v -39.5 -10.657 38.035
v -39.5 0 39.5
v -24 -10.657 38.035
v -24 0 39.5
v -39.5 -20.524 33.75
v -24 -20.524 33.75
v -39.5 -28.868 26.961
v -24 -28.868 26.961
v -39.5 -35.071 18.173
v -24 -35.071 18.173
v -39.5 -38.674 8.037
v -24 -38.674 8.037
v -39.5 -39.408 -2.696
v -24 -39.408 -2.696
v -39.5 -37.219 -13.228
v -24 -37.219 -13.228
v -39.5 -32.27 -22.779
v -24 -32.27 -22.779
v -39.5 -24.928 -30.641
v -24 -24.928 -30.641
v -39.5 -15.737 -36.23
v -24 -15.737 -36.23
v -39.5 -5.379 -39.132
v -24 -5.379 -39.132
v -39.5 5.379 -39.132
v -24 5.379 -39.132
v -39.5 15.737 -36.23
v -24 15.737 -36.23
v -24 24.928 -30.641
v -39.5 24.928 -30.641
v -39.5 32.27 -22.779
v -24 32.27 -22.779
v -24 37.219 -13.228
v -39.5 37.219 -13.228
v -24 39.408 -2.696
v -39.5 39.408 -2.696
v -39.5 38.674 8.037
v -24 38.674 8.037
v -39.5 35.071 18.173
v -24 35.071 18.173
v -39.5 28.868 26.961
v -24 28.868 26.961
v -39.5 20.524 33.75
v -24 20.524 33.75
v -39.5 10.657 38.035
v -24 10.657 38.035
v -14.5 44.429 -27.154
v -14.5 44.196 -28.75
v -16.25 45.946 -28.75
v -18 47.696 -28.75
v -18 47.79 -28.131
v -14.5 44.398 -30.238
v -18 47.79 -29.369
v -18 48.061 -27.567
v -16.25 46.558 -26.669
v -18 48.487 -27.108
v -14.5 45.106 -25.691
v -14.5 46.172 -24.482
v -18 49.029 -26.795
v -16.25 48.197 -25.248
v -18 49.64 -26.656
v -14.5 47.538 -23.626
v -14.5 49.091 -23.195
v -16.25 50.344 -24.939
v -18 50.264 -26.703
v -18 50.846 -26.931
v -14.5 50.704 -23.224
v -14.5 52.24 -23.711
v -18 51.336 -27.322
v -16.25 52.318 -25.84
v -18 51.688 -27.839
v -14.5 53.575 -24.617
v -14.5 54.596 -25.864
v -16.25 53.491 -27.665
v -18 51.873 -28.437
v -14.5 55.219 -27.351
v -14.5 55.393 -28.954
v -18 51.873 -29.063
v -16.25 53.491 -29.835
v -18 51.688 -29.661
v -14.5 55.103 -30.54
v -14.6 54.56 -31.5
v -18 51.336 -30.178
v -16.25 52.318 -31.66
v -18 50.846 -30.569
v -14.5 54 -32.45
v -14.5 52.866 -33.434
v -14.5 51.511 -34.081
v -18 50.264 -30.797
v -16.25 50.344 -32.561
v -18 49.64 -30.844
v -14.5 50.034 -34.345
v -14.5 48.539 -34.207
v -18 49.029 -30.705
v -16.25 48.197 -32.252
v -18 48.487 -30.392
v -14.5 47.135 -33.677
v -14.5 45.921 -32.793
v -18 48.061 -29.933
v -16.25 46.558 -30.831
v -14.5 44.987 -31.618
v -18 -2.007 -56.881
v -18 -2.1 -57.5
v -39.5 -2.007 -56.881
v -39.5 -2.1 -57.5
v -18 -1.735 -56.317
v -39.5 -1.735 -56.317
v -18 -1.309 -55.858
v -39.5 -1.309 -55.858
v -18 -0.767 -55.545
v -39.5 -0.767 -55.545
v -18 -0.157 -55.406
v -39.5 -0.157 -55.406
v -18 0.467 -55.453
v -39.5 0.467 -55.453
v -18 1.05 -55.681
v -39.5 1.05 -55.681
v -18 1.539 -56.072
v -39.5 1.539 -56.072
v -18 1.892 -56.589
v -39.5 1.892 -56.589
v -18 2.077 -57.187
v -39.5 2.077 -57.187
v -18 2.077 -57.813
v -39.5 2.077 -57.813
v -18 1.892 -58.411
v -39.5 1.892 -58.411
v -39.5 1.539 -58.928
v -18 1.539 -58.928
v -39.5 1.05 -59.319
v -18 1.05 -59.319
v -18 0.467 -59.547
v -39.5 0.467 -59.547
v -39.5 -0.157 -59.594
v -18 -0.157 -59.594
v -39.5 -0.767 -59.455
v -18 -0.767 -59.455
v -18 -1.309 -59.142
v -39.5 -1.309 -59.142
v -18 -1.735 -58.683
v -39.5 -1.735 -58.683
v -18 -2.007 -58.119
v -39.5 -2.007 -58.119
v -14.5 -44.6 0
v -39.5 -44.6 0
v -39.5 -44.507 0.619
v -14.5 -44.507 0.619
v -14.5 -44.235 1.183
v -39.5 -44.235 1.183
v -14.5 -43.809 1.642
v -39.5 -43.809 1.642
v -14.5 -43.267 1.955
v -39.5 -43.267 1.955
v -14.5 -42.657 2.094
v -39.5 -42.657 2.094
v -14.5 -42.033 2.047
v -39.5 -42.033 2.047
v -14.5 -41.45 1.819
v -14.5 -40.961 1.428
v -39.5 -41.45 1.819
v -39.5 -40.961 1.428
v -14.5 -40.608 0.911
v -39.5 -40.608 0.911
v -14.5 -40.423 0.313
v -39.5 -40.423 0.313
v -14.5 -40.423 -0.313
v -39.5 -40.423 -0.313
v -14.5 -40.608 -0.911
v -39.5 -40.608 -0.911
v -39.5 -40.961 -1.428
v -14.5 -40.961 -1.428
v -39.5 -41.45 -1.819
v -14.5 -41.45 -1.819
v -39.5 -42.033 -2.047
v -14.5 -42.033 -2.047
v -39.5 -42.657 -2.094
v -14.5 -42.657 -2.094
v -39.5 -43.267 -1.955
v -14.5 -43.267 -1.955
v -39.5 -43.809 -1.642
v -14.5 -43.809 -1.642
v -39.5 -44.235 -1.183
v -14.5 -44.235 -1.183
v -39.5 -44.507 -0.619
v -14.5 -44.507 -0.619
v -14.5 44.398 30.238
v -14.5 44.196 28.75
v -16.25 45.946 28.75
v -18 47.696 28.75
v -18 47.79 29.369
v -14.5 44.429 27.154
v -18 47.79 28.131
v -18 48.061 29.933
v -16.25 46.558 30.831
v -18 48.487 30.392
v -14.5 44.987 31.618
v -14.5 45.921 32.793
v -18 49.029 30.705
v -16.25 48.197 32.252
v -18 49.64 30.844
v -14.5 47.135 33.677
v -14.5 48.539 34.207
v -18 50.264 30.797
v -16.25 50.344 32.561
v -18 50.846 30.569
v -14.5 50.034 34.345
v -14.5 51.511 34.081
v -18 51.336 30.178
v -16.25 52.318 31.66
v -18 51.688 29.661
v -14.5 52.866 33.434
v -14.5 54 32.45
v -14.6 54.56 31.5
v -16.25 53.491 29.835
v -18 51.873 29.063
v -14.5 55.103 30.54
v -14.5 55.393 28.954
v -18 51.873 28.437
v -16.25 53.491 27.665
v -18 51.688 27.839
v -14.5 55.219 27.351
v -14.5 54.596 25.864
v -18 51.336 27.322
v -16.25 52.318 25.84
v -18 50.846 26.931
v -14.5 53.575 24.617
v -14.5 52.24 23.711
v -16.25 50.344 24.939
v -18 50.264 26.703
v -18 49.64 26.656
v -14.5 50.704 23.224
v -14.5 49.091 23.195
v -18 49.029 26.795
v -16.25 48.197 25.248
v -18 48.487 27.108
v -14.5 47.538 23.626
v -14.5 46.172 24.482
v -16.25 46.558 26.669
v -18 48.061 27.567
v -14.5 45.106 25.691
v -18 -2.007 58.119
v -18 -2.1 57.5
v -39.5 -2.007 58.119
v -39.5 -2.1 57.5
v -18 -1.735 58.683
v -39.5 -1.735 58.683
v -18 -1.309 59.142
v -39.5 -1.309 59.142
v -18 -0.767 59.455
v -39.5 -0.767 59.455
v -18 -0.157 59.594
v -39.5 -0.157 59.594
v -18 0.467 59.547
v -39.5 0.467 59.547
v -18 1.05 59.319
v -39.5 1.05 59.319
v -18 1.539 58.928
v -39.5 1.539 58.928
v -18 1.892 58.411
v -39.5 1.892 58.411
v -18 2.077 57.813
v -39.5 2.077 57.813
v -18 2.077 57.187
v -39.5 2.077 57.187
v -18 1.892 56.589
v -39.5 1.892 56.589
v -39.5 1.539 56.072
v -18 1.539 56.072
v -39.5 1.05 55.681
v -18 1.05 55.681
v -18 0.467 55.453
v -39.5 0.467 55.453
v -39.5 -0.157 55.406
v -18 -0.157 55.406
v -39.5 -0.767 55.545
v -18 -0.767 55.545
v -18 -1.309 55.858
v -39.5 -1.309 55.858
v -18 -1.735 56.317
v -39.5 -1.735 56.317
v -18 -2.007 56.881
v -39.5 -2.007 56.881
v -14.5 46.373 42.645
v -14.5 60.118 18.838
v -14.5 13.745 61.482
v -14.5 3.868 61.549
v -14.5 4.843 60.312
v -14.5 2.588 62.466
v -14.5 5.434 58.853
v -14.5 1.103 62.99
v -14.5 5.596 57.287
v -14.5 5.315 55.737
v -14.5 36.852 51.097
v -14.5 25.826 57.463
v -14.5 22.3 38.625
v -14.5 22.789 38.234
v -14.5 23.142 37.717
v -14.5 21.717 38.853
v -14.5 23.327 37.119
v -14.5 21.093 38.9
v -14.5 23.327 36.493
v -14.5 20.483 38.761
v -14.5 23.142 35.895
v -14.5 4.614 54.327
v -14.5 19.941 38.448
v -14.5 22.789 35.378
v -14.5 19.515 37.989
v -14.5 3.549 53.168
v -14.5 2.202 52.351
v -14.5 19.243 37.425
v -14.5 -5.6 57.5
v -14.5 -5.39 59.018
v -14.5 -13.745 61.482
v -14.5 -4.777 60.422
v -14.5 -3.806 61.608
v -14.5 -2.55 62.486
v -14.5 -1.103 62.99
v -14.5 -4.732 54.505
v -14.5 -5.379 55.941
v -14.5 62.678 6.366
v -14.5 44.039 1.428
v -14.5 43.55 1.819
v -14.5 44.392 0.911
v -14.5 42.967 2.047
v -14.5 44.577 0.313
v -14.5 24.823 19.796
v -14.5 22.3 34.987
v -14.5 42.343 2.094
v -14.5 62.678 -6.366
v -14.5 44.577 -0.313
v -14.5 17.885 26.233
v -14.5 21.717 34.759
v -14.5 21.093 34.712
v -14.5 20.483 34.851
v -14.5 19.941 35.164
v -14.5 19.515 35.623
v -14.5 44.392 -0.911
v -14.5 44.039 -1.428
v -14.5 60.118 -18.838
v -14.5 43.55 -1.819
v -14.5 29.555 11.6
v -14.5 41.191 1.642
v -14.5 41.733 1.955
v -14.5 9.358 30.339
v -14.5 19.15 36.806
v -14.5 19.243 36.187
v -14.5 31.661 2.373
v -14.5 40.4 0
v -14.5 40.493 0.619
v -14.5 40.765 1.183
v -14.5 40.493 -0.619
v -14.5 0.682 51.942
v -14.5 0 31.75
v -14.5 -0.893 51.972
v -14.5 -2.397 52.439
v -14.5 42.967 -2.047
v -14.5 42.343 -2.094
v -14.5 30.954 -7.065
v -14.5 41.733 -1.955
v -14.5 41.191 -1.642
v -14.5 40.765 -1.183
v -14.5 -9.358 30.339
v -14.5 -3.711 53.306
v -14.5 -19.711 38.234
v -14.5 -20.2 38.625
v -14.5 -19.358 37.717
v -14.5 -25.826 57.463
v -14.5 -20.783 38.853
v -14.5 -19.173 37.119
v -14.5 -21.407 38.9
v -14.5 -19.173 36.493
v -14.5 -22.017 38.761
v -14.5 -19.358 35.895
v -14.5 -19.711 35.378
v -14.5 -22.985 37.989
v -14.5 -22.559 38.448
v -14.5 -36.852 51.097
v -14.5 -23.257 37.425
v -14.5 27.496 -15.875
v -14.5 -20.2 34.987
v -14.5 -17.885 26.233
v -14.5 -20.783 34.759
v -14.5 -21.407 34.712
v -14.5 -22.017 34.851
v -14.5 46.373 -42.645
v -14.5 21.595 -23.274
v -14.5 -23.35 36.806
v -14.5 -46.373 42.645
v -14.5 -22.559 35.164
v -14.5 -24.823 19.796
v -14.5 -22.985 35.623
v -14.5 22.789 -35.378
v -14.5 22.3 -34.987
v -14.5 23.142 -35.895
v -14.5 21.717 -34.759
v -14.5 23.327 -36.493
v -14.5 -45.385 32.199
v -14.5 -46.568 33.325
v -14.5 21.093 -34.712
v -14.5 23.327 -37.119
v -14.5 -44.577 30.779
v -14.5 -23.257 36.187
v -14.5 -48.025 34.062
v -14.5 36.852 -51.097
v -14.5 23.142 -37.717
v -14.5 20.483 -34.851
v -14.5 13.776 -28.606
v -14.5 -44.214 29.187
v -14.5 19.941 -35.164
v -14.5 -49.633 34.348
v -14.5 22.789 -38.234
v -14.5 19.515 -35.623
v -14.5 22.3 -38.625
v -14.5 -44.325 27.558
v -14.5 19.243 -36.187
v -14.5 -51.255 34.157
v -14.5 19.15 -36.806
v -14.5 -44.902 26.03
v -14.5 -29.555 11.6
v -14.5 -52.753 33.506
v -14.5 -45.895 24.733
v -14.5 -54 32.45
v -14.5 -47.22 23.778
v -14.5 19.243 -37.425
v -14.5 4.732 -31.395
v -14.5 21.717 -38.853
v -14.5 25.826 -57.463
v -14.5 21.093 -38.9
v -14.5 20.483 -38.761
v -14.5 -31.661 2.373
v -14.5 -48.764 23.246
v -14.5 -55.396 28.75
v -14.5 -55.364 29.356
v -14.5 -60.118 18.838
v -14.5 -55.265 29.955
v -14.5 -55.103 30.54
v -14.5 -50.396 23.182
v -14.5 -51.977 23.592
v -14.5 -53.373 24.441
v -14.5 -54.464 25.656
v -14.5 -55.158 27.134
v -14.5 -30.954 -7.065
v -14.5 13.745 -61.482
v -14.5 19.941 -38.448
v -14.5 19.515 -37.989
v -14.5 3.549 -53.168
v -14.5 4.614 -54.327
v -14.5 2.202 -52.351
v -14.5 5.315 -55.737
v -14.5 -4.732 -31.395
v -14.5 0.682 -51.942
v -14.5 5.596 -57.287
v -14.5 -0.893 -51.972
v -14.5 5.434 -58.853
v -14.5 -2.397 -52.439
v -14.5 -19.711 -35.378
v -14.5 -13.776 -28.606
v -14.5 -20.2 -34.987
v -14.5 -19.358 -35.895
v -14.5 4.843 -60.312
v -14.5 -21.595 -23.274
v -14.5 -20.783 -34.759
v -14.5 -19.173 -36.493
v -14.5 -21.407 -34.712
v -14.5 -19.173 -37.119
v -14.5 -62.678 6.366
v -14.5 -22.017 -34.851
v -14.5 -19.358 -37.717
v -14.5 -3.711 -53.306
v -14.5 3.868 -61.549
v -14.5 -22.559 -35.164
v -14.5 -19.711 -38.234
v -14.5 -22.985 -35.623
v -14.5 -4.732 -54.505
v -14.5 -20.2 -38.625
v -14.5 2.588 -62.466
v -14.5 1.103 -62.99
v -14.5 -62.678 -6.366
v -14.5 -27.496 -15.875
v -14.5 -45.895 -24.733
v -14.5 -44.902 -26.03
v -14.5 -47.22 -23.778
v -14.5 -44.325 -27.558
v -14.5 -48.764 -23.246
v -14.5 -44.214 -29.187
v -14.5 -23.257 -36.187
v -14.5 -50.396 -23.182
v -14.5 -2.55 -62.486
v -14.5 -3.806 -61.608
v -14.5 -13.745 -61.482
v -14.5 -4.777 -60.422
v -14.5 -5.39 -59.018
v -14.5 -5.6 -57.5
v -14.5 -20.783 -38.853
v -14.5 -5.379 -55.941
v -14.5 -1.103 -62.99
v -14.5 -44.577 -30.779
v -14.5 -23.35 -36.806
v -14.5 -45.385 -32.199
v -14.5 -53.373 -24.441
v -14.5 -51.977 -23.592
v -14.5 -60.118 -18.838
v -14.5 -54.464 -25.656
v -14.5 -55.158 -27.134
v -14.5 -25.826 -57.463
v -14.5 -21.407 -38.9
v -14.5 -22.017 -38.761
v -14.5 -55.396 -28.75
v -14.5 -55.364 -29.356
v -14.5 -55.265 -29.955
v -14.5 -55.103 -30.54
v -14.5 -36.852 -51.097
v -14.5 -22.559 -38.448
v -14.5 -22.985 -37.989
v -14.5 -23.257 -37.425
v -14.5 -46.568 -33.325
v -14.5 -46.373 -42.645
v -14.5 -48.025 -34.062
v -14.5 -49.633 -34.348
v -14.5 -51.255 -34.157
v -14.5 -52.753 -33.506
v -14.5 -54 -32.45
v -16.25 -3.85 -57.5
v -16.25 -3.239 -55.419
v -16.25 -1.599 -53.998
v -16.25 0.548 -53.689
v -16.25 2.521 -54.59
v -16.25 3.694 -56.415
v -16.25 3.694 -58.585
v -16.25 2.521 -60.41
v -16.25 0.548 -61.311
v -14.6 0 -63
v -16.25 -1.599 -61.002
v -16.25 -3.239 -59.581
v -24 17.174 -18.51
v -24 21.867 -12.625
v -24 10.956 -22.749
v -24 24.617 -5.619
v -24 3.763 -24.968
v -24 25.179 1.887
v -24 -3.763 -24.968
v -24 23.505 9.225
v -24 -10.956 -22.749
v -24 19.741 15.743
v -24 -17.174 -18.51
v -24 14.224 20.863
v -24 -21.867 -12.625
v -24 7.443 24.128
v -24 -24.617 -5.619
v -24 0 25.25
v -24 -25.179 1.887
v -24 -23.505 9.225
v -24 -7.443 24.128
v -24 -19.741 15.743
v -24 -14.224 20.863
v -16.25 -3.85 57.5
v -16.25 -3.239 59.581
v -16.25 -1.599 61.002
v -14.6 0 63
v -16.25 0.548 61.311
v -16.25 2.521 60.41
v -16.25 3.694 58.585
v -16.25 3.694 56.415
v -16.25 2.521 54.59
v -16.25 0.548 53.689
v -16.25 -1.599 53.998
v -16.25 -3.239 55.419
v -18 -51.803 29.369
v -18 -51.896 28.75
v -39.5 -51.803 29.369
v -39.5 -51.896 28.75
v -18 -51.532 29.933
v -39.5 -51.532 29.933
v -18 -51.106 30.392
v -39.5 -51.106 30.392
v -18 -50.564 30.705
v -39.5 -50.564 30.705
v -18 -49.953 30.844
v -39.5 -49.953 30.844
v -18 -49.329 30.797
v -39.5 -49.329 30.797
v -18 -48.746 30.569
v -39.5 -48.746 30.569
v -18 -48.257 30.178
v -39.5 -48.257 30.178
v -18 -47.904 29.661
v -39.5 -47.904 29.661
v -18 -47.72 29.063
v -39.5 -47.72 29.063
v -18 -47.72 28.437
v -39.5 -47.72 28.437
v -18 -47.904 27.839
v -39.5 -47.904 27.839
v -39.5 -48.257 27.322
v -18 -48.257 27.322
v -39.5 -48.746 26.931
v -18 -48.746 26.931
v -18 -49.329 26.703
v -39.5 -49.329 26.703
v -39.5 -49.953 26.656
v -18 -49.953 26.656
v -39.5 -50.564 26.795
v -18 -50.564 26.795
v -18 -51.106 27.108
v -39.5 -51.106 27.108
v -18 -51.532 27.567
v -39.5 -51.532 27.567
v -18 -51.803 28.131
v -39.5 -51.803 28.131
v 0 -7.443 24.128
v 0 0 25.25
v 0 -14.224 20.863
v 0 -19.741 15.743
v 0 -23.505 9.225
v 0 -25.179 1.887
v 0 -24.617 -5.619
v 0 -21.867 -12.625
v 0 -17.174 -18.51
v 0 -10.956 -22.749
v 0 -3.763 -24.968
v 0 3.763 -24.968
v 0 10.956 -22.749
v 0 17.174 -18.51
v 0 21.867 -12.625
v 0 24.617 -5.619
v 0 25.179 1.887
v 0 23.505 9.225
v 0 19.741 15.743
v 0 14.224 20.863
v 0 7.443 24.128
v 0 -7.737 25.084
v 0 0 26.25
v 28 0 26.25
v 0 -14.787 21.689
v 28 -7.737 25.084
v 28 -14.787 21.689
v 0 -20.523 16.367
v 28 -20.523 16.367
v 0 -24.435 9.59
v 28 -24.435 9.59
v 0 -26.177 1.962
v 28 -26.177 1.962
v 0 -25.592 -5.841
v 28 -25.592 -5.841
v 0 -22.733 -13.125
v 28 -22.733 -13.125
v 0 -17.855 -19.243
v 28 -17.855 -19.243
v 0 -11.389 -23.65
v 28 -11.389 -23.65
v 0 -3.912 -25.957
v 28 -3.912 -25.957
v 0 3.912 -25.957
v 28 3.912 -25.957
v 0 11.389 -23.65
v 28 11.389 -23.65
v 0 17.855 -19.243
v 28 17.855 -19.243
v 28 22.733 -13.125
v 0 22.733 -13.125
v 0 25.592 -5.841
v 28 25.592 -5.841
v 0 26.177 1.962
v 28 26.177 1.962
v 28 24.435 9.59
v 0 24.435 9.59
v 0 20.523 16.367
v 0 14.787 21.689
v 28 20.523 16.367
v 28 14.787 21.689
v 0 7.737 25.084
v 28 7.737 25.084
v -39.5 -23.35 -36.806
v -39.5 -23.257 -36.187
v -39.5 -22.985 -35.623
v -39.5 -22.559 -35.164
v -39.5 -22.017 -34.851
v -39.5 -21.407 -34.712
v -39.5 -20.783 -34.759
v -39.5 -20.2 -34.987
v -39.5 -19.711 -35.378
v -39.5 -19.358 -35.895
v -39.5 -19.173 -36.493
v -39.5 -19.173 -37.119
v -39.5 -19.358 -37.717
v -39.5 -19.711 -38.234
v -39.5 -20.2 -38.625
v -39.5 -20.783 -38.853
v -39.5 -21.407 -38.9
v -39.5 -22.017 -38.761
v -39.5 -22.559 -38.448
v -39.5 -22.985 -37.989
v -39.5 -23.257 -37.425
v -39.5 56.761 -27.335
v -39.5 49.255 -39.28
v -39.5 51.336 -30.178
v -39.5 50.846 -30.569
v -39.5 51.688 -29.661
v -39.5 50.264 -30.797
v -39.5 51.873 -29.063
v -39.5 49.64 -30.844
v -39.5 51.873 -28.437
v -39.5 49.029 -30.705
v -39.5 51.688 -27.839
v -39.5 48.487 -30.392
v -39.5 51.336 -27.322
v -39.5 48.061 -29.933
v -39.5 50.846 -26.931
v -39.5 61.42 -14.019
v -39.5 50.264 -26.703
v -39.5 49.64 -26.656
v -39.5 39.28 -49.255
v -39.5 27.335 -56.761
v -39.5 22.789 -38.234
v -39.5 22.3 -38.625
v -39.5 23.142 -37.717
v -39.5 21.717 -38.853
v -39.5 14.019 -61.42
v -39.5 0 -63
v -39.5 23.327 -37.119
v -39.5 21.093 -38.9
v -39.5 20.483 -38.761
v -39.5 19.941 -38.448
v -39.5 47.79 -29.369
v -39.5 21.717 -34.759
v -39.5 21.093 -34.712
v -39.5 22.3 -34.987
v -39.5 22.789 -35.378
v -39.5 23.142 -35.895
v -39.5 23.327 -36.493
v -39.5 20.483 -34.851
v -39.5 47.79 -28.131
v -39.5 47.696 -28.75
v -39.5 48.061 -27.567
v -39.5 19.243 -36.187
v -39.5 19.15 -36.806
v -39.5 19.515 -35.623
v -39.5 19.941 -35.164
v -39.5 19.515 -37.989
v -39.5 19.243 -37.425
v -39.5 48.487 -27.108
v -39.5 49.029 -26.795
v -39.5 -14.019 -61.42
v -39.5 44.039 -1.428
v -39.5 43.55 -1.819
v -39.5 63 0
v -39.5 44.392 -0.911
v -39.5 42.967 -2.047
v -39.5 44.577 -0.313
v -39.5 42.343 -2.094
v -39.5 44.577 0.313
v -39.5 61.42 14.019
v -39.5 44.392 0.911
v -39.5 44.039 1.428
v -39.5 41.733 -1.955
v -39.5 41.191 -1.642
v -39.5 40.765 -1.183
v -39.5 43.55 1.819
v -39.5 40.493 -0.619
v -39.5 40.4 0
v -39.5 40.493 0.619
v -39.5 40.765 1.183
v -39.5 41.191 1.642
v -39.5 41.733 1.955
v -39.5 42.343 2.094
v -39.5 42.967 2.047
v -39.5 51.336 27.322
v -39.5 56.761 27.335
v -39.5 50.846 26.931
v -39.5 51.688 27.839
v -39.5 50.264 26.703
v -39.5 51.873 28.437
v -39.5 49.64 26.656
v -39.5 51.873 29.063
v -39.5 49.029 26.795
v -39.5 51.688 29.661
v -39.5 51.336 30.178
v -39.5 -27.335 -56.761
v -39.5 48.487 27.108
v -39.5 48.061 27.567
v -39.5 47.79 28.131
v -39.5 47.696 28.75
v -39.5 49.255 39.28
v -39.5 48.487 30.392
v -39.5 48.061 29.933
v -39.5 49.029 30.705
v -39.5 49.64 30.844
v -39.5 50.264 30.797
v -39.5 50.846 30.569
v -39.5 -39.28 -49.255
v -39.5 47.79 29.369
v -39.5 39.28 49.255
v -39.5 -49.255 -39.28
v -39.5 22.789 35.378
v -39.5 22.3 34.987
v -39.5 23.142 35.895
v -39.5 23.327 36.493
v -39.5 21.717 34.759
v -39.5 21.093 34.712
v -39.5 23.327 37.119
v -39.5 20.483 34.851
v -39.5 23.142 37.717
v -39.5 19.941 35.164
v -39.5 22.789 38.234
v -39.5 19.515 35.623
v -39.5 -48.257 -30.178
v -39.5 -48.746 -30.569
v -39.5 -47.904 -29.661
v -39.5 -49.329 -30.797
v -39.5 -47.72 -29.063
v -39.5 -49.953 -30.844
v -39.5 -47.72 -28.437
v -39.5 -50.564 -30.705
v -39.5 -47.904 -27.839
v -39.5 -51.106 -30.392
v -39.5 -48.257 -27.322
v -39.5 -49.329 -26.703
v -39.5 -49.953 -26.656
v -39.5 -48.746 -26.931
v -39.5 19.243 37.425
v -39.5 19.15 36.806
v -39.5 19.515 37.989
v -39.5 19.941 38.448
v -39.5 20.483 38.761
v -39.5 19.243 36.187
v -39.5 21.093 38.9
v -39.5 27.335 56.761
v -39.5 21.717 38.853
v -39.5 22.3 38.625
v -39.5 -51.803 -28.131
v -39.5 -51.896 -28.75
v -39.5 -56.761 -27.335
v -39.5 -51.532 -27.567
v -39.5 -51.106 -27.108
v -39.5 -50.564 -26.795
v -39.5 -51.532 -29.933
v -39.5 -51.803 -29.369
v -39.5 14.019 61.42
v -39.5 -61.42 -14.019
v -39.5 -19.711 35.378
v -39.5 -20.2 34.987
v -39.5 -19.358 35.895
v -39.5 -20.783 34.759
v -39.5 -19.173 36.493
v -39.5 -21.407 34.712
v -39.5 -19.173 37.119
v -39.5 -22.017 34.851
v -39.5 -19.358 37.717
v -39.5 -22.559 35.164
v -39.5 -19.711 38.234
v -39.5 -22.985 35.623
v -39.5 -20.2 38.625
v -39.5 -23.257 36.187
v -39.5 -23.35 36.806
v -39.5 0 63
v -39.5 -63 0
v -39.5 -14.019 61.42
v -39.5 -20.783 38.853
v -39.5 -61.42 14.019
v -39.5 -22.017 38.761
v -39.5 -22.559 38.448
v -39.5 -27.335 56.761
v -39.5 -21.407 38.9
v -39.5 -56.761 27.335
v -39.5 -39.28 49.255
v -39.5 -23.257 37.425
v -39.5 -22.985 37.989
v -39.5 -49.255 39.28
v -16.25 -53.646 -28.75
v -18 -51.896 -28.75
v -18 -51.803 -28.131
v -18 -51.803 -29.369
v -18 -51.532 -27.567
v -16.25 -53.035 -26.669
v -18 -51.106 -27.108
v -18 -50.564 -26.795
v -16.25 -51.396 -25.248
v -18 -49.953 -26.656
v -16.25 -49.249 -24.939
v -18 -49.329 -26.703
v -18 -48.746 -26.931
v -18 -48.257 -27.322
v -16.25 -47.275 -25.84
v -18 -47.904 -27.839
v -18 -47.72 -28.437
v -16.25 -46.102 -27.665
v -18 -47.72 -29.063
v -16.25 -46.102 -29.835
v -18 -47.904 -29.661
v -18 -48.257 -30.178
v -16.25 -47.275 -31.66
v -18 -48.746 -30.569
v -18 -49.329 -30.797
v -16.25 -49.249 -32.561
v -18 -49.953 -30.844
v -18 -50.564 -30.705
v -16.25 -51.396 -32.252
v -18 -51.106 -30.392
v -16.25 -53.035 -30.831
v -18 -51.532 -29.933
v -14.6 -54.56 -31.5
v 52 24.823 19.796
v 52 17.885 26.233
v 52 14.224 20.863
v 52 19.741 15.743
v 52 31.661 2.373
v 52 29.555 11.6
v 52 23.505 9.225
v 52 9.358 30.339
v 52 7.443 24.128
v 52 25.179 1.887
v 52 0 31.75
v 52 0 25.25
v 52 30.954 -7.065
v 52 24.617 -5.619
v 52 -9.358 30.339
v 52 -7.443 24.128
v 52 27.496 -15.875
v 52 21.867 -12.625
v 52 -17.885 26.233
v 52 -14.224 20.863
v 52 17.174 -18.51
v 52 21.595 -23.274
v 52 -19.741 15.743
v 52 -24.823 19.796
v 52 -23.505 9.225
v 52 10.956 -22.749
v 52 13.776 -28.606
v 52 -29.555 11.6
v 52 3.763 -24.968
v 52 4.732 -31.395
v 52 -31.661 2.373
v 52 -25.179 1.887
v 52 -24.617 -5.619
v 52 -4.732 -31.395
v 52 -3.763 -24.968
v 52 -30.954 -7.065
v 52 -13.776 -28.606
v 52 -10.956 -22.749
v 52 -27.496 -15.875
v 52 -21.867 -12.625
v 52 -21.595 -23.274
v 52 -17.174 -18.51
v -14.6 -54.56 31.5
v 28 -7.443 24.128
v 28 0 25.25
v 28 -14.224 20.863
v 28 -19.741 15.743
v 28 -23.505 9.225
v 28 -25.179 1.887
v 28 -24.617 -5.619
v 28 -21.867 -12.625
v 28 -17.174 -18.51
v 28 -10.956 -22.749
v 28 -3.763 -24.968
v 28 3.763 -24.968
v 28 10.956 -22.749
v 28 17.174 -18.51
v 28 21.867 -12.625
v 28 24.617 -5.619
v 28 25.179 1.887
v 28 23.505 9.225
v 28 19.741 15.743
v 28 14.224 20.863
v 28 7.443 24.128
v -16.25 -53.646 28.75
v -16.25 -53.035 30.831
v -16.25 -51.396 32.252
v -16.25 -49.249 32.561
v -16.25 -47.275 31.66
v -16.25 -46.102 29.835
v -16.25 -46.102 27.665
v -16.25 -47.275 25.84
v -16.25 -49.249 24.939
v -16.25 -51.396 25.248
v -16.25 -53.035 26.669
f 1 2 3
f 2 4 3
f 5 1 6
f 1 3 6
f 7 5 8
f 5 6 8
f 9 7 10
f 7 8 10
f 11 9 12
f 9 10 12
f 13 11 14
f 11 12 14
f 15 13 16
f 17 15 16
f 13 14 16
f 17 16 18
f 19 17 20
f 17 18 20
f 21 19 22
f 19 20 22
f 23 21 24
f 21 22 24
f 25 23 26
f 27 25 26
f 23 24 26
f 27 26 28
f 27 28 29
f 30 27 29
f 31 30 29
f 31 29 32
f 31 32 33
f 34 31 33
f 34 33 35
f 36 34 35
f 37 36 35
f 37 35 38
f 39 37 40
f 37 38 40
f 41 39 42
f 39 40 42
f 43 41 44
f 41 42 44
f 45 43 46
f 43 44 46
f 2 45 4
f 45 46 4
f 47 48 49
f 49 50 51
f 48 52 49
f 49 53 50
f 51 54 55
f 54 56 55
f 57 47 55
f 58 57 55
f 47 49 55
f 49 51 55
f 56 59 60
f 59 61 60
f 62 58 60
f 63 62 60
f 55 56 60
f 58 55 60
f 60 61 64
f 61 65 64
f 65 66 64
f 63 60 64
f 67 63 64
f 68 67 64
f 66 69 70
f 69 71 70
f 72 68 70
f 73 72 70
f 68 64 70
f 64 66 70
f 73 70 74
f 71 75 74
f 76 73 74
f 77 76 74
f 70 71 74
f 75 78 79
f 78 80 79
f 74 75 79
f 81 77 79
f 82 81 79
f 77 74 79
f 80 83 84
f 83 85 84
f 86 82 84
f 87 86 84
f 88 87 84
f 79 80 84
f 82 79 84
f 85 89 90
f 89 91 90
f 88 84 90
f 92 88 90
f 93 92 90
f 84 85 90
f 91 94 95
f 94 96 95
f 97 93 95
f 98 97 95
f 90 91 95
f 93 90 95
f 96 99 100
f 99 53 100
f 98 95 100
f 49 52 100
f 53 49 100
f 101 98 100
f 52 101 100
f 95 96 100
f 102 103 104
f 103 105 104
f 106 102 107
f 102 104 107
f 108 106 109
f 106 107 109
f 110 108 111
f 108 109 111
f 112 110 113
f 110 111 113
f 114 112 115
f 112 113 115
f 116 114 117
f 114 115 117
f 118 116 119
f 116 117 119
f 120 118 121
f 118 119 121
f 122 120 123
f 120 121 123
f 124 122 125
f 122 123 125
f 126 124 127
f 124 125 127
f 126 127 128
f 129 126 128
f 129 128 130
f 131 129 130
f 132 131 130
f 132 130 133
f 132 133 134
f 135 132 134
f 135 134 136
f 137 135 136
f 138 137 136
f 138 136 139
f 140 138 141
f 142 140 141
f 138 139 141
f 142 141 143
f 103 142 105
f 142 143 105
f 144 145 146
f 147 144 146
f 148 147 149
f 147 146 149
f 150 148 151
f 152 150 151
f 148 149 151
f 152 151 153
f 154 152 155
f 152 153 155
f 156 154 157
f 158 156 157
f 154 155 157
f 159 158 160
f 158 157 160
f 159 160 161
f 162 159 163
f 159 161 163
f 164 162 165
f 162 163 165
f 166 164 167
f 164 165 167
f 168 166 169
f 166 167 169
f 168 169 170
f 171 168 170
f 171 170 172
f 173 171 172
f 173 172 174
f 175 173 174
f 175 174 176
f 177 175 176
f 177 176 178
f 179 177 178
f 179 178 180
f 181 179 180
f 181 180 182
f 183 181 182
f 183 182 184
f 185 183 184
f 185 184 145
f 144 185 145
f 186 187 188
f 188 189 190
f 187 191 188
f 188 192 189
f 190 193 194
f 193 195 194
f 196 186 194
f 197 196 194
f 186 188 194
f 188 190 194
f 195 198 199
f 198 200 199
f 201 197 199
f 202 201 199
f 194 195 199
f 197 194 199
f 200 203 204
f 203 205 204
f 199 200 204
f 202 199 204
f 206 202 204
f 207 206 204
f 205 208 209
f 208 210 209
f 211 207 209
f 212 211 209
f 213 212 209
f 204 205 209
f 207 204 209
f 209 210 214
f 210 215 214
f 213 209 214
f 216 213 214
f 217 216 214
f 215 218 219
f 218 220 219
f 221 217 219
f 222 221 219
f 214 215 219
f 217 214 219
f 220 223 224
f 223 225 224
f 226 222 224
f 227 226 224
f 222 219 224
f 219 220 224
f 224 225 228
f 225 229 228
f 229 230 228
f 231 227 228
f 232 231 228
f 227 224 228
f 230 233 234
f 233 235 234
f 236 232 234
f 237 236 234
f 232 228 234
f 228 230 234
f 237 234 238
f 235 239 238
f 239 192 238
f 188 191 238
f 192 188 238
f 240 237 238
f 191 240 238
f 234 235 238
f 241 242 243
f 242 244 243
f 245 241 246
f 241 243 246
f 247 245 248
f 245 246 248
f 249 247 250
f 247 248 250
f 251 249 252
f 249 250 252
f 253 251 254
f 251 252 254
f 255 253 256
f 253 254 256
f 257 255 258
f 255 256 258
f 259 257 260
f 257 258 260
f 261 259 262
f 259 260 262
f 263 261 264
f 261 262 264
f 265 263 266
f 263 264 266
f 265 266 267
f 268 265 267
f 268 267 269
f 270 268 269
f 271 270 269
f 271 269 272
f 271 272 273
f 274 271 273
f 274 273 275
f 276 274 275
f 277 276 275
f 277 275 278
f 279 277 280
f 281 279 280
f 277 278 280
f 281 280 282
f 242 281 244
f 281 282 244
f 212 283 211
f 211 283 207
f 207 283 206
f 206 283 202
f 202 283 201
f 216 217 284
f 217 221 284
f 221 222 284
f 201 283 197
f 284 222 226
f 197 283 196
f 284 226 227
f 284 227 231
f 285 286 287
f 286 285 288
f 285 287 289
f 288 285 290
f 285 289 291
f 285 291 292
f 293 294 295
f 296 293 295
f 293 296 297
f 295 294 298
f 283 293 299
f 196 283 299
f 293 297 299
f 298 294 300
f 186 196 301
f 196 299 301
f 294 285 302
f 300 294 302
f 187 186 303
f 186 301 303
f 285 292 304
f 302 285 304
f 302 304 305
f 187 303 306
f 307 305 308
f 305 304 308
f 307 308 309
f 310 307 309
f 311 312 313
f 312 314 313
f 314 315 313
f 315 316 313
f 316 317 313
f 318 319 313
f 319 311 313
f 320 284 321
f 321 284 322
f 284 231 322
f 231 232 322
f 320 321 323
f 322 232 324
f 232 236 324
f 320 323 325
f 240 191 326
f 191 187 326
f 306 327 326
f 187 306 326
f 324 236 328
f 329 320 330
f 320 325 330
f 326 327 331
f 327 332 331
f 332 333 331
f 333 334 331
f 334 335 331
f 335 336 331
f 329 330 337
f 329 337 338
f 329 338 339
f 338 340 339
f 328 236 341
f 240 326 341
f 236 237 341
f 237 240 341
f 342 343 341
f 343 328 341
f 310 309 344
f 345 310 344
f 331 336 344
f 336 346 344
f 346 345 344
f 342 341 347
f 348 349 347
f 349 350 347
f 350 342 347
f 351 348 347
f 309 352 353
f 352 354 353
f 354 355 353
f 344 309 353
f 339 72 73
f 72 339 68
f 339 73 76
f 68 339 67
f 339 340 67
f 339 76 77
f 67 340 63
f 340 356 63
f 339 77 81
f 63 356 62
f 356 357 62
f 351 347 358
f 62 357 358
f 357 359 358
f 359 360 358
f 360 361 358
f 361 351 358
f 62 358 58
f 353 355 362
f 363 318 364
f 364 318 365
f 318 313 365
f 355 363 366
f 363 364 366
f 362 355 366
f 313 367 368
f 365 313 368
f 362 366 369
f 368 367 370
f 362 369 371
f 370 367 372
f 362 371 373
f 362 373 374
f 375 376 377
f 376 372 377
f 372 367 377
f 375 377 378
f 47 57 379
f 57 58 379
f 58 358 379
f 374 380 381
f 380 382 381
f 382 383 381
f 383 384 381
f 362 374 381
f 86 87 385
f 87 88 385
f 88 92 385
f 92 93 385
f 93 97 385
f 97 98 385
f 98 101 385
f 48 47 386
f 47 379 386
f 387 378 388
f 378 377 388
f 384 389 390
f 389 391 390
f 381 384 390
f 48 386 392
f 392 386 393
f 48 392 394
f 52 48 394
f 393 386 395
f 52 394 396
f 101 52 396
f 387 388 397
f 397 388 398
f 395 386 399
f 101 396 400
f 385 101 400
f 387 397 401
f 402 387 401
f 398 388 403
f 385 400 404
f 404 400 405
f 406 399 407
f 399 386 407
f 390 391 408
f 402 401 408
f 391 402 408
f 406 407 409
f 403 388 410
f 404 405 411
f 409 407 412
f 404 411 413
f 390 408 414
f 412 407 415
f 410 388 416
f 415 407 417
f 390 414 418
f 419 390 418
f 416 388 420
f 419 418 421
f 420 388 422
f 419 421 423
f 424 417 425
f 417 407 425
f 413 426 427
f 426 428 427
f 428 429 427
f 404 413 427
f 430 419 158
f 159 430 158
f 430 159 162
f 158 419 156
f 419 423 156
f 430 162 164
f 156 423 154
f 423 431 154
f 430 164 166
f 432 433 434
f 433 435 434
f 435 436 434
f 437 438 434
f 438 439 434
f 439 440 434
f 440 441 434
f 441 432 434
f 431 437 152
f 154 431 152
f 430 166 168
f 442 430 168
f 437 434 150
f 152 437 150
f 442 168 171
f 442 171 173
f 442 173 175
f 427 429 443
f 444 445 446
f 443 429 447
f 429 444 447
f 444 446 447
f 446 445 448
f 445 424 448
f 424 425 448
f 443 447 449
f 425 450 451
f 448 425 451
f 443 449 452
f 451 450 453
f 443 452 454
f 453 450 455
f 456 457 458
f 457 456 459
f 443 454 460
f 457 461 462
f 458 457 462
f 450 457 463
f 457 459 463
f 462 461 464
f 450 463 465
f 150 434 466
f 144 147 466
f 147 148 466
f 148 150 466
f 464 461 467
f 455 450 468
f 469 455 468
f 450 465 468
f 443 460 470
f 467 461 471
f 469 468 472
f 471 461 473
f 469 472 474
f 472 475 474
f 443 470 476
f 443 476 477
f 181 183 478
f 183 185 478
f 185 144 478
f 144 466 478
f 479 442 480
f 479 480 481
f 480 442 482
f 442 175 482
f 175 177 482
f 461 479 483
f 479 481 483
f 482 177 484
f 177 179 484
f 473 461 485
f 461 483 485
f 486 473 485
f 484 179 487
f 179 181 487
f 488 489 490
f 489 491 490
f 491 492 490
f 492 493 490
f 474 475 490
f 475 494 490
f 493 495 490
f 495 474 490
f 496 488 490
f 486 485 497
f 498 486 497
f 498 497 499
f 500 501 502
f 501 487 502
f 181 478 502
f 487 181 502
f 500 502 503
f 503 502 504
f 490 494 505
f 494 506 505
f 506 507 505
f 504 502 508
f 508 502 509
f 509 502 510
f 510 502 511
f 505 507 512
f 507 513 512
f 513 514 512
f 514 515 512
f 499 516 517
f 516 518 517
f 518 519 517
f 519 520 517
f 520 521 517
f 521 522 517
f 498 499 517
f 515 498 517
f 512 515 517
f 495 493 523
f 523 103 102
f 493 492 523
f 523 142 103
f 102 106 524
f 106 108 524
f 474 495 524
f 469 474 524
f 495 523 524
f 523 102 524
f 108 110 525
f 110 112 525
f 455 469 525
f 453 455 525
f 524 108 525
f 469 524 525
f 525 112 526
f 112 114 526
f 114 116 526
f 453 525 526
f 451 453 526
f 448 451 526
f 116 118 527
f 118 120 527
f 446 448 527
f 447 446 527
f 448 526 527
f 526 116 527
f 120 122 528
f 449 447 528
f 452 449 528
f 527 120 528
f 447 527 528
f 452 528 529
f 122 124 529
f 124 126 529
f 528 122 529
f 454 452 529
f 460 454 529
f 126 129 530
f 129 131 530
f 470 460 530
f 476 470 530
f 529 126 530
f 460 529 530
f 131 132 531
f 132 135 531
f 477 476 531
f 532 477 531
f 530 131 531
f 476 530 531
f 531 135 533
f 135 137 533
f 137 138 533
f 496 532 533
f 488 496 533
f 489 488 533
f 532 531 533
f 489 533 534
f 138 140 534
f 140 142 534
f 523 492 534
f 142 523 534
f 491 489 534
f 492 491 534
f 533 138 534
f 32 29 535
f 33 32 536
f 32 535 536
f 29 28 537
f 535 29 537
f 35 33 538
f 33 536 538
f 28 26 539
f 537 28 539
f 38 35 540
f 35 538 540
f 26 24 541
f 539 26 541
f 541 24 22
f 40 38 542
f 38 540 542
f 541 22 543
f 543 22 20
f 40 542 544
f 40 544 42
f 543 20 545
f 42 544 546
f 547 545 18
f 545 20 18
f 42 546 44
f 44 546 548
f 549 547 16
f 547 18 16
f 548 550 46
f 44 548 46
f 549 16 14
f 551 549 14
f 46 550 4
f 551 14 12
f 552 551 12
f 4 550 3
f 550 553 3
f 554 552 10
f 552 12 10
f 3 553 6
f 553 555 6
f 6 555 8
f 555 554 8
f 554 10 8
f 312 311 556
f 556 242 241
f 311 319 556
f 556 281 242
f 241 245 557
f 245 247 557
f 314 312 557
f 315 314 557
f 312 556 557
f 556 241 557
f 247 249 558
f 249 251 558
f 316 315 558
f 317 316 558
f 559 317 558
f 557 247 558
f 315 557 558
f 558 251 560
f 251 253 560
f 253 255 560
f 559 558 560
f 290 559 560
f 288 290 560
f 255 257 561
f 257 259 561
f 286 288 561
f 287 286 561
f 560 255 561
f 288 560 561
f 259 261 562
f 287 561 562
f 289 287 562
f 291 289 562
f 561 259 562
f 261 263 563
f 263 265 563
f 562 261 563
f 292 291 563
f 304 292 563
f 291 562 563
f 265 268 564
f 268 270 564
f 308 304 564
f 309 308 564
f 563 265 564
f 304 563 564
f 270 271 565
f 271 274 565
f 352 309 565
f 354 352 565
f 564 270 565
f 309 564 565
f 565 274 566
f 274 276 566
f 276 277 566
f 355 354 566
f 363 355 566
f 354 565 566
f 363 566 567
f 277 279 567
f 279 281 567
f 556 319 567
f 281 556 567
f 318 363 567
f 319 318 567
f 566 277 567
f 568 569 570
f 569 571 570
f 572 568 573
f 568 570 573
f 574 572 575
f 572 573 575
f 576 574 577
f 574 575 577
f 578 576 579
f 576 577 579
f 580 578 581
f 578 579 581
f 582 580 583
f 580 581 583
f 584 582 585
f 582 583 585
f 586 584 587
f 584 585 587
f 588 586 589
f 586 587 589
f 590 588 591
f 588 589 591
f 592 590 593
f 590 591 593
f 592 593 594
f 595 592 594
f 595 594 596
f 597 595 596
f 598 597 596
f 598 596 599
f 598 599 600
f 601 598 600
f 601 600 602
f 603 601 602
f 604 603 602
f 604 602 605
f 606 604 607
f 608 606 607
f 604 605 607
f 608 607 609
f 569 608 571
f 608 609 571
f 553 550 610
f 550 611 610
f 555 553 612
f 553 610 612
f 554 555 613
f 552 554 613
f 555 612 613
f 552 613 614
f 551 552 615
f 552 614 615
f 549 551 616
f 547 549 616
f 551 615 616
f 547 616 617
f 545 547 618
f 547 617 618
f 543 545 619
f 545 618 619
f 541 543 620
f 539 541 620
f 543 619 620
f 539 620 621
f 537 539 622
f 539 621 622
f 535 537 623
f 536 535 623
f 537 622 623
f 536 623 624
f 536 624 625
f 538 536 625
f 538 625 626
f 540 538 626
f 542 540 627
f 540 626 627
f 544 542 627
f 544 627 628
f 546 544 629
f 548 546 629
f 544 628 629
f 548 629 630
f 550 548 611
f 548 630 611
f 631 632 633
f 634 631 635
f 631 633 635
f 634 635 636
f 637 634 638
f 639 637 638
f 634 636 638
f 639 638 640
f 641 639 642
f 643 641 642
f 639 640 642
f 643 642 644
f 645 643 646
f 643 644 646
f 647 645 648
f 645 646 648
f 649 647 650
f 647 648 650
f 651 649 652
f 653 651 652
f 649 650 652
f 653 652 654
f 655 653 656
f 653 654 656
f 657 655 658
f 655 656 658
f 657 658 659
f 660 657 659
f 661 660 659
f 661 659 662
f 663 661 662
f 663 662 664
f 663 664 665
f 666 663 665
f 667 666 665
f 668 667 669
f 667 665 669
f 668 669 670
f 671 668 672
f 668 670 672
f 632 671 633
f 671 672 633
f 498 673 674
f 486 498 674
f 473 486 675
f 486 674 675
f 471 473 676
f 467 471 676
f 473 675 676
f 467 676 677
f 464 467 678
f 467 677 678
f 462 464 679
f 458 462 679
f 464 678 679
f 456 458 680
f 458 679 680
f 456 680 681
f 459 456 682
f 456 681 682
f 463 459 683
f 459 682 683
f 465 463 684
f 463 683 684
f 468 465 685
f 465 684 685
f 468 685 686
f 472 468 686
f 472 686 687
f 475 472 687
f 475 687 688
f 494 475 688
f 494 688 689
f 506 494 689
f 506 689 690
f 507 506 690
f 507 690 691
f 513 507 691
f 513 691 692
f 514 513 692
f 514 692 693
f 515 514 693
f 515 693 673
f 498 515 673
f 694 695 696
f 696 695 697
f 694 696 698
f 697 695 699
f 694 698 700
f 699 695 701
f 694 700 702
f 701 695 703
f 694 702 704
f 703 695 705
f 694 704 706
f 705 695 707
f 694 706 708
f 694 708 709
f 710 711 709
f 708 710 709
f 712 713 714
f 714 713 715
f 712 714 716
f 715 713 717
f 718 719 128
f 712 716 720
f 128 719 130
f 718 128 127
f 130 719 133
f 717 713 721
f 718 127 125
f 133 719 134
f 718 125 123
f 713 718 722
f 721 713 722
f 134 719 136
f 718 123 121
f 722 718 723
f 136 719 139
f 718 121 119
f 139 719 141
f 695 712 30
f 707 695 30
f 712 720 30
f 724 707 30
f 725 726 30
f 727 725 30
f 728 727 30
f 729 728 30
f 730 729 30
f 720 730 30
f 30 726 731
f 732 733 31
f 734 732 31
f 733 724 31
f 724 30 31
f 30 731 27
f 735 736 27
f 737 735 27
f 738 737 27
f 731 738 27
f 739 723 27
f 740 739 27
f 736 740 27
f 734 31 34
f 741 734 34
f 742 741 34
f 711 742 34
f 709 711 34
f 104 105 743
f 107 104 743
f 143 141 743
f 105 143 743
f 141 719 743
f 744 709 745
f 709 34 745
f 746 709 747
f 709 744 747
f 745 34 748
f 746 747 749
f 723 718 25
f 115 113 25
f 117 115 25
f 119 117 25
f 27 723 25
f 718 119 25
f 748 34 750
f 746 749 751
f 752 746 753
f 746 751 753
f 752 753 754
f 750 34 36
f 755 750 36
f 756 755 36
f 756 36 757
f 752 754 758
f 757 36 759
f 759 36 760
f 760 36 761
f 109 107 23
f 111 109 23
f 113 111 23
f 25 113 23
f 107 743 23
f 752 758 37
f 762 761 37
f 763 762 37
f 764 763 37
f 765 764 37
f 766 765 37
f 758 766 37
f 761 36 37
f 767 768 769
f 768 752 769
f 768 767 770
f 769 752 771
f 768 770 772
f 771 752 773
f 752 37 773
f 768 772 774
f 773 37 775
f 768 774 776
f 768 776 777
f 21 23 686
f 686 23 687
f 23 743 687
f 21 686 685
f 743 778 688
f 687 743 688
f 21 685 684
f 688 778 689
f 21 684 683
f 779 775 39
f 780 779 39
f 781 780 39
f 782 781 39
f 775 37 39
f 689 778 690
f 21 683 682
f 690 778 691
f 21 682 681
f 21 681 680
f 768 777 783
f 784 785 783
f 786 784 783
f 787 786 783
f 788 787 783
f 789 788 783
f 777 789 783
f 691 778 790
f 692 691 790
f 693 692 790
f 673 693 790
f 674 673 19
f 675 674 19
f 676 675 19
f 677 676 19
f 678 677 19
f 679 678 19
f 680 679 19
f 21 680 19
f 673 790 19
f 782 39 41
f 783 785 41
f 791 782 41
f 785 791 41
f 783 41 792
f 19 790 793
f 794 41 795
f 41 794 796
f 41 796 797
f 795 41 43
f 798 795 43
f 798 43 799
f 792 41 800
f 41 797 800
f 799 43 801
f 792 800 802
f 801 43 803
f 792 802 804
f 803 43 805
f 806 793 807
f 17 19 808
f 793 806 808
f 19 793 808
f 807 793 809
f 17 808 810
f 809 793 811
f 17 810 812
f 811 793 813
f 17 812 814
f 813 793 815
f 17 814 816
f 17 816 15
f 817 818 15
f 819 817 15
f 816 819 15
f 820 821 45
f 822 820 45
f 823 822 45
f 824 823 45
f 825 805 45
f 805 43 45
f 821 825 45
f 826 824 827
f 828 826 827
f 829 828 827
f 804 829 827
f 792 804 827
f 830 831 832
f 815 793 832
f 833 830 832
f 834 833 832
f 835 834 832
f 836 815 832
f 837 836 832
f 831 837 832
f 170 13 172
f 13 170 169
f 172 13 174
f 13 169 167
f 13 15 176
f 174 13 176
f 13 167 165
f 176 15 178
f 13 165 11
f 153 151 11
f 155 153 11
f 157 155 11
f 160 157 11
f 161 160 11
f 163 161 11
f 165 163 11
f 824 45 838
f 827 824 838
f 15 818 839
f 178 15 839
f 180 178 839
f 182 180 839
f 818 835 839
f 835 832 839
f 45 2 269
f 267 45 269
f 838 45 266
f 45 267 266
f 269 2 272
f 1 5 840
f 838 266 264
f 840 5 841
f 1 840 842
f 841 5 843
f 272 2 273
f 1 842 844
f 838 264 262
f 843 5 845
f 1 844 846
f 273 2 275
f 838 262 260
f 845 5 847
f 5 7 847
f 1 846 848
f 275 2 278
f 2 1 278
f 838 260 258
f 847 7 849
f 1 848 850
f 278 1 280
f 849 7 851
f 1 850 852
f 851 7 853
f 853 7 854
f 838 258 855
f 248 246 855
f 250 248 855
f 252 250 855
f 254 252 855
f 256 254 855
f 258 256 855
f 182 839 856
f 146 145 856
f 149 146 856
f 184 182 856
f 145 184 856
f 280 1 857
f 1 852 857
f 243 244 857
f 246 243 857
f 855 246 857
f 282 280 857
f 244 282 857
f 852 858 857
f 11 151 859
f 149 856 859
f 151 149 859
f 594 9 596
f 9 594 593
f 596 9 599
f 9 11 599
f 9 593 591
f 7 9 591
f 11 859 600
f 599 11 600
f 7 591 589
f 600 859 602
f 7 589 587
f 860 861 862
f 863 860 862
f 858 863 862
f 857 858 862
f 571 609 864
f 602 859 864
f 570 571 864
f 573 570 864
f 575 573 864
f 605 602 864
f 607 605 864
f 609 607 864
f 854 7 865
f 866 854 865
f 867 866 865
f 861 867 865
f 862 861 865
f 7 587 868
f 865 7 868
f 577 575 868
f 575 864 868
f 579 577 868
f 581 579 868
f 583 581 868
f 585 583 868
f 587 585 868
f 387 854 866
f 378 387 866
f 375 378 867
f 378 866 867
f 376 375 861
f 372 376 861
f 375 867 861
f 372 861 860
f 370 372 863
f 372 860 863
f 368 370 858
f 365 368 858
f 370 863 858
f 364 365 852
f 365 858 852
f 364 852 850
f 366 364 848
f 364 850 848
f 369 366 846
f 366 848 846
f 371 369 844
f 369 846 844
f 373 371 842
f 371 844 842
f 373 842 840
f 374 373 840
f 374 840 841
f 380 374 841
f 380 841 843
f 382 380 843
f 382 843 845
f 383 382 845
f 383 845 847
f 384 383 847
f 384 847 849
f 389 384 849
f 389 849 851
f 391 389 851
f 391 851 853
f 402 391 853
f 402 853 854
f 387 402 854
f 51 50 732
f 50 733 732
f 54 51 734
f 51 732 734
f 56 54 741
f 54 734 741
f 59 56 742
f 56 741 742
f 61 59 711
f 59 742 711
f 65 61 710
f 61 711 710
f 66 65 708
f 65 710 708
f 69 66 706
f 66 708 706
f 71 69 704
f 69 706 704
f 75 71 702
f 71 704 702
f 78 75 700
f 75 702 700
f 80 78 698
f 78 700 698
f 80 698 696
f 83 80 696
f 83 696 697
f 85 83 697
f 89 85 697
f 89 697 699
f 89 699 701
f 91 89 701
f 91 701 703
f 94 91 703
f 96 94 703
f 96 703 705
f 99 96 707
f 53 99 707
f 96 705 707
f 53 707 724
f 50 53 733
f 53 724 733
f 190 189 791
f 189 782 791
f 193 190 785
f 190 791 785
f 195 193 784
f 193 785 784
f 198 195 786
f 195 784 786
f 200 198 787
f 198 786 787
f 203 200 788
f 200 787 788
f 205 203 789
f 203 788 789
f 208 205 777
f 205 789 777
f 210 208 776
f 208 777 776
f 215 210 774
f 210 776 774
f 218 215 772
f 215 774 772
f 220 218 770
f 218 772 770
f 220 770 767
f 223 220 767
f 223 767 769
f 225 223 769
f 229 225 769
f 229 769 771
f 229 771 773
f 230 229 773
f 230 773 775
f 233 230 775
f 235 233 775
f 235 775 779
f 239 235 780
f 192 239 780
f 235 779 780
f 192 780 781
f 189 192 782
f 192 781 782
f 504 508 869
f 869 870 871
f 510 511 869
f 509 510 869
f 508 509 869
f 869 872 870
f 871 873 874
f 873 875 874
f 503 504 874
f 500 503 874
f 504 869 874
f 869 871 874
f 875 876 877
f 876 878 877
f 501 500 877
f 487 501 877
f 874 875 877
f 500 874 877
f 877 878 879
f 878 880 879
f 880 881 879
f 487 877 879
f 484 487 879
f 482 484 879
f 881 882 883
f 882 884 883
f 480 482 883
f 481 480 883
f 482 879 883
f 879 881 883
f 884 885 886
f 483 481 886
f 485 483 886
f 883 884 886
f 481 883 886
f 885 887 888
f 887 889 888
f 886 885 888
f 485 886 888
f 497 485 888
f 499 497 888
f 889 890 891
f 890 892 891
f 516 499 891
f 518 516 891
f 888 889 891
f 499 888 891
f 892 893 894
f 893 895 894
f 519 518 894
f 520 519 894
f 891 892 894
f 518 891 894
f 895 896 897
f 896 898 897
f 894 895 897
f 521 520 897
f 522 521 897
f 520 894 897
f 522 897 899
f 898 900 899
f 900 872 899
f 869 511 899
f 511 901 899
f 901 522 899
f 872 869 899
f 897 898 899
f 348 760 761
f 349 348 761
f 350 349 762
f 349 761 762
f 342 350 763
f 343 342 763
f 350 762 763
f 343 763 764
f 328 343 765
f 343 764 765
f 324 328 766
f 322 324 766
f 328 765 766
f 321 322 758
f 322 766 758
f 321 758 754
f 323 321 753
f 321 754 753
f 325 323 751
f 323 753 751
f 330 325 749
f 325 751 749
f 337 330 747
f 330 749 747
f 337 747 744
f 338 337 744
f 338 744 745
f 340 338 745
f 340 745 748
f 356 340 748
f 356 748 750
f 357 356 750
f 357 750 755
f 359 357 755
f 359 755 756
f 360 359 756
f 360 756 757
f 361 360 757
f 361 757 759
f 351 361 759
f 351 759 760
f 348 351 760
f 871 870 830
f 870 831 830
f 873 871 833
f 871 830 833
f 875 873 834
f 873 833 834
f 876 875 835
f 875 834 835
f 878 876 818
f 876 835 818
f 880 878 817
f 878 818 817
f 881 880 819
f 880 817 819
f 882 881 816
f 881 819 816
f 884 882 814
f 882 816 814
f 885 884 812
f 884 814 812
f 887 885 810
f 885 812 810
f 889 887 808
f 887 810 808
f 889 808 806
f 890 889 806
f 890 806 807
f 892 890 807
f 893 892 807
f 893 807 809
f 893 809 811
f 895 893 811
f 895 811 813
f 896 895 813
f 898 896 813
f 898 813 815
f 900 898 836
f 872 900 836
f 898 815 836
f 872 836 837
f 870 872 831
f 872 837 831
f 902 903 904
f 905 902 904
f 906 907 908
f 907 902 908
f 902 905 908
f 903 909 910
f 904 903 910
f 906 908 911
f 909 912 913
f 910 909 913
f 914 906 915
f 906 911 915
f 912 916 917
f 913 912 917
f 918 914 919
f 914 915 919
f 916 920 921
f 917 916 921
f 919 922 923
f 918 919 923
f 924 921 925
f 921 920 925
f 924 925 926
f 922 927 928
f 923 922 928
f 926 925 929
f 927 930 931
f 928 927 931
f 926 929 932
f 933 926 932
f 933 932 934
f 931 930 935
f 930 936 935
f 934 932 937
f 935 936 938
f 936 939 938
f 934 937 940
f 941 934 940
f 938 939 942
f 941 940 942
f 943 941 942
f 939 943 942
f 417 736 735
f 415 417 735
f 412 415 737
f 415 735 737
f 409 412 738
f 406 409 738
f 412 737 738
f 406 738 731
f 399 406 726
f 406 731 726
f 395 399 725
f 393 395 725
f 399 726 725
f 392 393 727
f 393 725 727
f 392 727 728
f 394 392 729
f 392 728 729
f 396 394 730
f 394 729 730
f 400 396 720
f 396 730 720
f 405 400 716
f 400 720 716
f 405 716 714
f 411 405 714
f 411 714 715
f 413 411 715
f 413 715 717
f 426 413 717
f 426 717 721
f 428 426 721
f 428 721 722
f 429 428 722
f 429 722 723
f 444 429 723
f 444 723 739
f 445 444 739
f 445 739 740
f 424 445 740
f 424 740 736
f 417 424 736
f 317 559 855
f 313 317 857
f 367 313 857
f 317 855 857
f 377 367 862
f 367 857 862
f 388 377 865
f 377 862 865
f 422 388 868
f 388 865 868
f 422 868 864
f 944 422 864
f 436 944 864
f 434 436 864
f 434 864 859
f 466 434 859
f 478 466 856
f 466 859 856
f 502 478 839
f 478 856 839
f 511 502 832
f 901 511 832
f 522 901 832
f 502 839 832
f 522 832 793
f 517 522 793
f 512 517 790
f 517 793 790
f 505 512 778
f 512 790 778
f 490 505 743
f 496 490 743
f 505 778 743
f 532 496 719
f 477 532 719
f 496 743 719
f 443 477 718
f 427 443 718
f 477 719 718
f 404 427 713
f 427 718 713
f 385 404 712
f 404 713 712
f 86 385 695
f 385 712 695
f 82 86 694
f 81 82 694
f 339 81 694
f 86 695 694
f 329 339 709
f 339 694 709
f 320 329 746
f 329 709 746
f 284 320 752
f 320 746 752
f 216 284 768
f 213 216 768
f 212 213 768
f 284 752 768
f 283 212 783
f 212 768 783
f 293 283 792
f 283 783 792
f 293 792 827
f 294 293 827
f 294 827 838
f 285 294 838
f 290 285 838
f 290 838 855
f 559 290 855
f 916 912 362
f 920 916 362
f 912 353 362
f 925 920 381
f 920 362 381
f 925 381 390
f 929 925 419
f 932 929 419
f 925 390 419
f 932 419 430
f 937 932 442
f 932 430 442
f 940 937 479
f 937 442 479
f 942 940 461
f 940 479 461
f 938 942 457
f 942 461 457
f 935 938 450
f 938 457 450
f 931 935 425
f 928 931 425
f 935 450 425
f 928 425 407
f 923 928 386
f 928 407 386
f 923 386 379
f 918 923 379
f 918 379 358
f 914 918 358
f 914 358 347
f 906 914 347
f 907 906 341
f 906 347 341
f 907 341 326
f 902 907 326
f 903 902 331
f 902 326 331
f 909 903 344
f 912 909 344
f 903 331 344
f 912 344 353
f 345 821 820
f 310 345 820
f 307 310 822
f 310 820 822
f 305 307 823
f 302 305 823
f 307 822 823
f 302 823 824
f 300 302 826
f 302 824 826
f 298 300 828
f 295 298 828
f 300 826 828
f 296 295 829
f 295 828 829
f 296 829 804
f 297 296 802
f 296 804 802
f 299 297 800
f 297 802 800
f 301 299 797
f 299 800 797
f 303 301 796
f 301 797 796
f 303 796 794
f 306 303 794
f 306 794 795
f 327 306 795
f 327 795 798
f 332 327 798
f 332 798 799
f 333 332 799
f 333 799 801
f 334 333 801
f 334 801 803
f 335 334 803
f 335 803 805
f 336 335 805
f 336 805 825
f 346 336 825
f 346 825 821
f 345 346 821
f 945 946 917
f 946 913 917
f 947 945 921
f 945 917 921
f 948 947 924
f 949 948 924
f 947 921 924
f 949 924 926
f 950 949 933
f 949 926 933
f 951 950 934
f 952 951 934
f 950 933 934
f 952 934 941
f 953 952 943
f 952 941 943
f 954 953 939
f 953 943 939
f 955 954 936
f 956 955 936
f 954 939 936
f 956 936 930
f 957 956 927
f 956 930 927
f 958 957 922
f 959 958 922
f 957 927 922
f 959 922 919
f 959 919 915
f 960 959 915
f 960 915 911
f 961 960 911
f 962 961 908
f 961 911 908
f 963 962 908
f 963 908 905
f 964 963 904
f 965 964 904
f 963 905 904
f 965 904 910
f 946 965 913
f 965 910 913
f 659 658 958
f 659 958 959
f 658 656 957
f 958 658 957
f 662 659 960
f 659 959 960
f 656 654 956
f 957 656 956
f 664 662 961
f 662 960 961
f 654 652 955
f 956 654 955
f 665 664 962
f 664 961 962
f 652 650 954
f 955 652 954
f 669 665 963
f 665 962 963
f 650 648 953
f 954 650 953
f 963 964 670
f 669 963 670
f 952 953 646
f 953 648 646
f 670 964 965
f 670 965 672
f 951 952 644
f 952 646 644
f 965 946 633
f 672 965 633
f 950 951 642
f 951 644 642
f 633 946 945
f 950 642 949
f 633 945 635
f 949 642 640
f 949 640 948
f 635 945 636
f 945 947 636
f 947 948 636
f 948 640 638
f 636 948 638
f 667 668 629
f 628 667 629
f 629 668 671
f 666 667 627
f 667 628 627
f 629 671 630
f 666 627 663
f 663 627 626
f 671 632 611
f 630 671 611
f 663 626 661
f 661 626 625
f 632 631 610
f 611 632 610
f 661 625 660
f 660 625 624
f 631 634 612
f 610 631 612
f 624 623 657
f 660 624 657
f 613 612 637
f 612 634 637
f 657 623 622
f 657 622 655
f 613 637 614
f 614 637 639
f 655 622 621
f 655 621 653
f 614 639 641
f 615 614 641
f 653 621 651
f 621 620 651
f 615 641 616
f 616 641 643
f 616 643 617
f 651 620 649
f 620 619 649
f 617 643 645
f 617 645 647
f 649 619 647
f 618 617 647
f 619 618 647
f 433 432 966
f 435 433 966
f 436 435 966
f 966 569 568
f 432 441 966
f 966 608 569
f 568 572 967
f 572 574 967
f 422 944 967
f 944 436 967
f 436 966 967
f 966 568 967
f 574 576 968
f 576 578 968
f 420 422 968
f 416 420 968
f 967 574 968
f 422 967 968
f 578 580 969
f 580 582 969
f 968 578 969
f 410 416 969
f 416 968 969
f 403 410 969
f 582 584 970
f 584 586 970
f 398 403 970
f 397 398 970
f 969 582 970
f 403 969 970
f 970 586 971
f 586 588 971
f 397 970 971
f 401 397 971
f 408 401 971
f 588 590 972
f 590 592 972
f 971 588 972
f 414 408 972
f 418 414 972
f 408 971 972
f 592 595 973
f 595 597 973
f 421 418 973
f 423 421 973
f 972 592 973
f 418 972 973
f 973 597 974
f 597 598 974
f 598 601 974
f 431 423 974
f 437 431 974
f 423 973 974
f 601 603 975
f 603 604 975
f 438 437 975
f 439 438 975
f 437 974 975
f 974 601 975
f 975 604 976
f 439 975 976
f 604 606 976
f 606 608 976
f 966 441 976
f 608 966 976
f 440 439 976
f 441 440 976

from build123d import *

# Parameters (mm, degrees)
F3_D           = 4.2
F3_CSINK_D     = 11.2
F3_CSINK_ANGLE = 90
F5_D           = 4.2


with BuildPart() as f1:
    # F0 (on Front) → F1 (revolve)
    with BuildSketch(Plane.XZ):
        Polygon((28, 25.25), (52, 25.25), (52, 31.75), (-14.5, 31.75), (-14.5, 63), (-39.5, 63), (-39.5, 39.5), (-24, 39.5), (-24, 25.25), (0, 25.25), (0, 26.25), (28, 26.25), align=None)
    revolve(axis=Axis((7.4011684002, 0, 0), (1, 0, 0)))

    # F3 (through all)
    with Locations(Plane.YZ.offset(-14.5)):
        with Locations((0, 57.5), (49.7964607176, 28.75), (49.7964607176, -28.75), (-49.7964607176, -28.75), (0, -57.5), (-49.7964607176, 28.75)):
            CounterSinkHole(F3_D / 2, F3_CSINK_D / 2, counter_sink_angle=F3_CSINK_ANGLE)

    # F5 (through all)
    with Locations(Plane.YZ.offset(-14.5)):
        with Locations((-21.25, 36.8060796608), (21.25, 36.8060796608), (42.5, 0), (21.25, -36.8060796608), (-21.25, -36.8060796608), (-42.5, 0)):
            Hole(F5_D / 2)


solid = f1.part
